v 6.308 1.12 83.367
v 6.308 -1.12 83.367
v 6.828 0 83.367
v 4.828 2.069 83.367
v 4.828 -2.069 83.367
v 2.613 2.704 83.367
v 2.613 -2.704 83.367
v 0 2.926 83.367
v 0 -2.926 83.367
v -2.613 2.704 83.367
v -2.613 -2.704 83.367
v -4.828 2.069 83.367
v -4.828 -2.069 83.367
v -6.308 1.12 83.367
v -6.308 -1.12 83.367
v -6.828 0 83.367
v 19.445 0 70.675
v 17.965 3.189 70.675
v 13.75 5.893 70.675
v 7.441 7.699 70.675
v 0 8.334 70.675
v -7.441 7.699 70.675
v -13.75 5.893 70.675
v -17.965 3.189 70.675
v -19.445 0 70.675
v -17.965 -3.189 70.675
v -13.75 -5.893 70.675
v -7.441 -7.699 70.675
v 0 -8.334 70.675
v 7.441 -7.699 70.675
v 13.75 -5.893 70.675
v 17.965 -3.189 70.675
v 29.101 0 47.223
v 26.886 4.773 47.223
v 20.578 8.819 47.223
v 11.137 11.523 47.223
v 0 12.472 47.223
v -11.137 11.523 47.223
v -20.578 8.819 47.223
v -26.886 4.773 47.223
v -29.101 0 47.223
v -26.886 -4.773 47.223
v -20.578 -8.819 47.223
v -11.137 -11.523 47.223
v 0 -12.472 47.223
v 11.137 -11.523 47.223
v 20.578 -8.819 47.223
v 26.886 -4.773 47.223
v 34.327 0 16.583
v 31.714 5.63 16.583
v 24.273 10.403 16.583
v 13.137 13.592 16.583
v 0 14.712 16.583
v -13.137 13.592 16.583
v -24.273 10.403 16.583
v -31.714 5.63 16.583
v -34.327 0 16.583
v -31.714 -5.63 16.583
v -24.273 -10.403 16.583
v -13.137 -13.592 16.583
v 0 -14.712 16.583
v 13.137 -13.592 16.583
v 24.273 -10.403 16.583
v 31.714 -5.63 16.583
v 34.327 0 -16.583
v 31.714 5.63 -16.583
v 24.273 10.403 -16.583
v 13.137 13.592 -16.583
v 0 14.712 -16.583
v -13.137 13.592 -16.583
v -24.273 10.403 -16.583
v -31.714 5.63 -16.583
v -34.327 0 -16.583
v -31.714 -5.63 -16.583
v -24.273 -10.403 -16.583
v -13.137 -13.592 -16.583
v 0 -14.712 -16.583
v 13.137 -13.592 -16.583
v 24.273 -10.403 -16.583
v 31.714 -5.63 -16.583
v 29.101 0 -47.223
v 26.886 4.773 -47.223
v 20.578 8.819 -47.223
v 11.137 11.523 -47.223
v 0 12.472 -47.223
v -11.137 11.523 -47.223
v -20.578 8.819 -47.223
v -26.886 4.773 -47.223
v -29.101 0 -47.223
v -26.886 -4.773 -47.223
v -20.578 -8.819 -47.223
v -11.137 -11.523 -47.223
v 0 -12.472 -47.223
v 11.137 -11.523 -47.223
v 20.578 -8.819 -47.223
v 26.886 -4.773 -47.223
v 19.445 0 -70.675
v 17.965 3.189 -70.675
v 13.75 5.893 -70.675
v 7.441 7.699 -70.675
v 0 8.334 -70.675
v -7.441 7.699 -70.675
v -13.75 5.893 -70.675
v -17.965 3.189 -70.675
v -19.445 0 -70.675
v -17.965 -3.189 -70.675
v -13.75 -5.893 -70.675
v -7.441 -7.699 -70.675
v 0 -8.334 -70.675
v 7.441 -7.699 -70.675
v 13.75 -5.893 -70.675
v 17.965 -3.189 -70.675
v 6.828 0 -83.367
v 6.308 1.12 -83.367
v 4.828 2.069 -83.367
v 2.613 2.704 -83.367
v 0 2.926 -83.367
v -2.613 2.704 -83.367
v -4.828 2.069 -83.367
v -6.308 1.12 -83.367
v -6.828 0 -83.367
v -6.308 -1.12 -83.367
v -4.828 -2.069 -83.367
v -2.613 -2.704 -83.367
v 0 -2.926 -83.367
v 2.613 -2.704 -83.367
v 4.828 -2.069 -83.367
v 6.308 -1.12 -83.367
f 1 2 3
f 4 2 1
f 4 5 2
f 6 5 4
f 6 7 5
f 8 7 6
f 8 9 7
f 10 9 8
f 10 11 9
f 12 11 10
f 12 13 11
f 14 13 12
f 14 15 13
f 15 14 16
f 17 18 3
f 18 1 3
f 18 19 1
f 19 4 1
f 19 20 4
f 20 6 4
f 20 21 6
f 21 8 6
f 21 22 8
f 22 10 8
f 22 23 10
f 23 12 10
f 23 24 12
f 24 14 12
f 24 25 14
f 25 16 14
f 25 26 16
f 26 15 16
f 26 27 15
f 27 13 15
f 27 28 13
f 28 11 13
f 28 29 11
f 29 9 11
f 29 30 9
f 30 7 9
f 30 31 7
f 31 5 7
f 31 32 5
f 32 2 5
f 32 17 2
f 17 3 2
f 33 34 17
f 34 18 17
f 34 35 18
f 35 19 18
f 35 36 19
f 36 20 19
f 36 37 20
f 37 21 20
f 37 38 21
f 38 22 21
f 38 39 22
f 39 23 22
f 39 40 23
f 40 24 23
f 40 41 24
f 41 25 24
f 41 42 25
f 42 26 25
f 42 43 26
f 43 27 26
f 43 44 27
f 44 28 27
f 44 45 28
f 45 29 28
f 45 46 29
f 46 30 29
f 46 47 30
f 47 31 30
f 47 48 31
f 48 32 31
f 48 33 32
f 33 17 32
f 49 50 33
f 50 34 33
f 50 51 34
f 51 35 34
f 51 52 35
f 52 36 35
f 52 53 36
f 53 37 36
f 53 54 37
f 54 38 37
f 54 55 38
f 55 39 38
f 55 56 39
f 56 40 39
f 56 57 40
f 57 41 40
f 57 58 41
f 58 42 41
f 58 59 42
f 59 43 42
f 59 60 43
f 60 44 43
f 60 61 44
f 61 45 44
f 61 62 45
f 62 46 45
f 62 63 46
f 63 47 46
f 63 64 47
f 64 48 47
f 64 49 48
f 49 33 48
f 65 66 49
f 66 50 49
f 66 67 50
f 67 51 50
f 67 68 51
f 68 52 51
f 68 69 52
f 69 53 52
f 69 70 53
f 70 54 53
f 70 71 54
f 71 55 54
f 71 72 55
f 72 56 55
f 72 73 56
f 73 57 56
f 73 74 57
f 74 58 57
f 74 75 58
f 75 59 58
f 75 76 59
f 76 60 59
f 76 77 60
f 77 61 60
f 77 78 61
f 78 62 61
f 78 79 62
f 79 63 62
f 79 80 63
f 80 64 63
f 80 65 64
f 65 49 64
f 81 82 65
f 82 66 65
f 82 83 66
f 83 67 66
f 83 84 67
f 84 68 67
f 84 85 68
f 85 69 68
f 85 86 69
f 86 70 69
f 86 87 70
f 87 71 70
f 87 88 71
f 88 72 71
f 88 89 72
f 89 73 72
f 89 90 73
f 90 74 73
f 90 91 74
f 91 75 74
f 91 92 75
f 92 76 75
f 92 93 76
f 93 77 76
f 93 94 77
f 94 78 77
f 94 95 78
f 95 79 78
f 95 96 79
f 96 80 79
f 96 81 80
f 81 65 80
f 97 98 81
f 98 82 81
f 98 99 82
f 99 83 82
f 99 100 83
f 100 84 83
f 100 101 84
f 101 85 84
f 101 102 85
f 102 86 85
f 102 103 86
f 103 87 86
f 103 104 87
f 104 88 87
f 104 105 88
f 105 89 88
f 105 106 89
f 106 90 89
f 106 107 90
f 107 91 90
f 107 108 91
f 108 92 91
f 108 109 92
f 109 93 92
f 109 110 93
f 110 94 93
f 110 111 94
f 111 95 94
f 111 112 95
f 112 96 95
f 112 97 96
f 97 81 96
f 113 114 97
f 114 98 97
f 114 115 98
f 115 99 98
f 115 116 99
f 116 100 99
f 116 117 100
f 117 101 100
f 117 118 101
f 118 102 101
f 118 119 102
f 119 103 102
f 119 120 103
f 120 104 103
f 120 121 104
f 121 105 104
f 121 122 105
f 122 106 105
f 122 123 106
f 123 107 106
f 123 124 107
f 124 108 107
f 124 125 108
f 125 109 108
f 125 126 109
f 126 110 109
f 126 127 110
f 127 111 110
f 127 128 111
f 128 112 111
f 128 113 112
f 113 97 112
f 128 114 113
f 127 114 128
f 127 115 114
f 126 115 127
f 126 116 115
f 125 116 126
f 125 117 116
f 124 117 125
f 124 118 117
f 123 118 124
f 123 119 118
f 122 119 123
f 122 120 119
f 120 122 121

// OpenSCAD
// Generated by SolidPython 1.0.1 on 2020-07-29 00:46:47


scale(v = [7, 3, 17]) {
	sphere(r = 5);
}
/***********************************************
*********      SolidPython code:      **********
************************************************
 
# import packages: SolidPython
from solid import *
from solid.utils import *
from itertools import chain, combinations, permutations


class Resize:

    def __init__(self, scad_file):
        self.scad_file = scad_file
        #self.scad_file = import_scad(scad_file)
        # cone/cylinder param:
        self.r1 = 0
        self.r2 = 0
        self.h = 0
        # rectangular prism param:
        self.w = 0
        self.l = 0
        # ellipse param:
        self.r = 0

    # import OpenScad code (file name corresponds to shape)


    # classify shape + parameters
    def assign(self, param1, param2, param3):
        if self.scad_file == 'cone.scad':
            self.r1 = param1
            self.r2 = param2
            self.h = param3
        elif self.scad_file == 'cylinder.scad':
            self.r1 = param1
            self.r2 = param2
            self.h = param3
        elif self.scad_file == 'rectangularPrism.scad':
            self.h = param1
            self.l = param2
            self.w = param3
        else:
            self.r = param1
            self.h = param2

    # resize parameters
    def iterate(self):
        x = range(3, 20, 2)
        i = 1
        if self.scad_file == 'cone.scad':
            tempList = list(permutations(x, 2))
            for temp in tempList:
                param1 = temp[0]
                param2 = temp[1]
                filepath = 'produced_scad_files/' + 'cone' + str(param1) + '_' + str(param2) + '_' + '.scad'
                scad_render_to_file(cylinder(h=param1, r1=param2, r2=0), filepath)

        elif self.scad_file == 'cylinder.scad':
            tempList = list(permutations(x, 3))
            for temp in tempList:
                param1 = temp[0]
                param2 = temp[1]
                filepath = 'produced_scad_files/' + 'cylinder' + str(param1) + '_' + str(param2) + '_' + '.scad'
                scad_render_to_file(cylinder(h=param1, r1=param2, r2=param2), filepath)

        elif self.scad_file == 'rectangularPrism.scad':
            tempList = list(permutations(x, 3))
            for temp in tempList:
                param1 = temp[0]
                param2 = temp[1]
                param3 = temp[2]
                filepath = 'produced_scad_files/' + 'rectangularPrism' + str(param1) + '_' + str(param2) + '_' + str(
                    param3) + '.scad'
                scad_render_to_file(cube(size=(param1, param2, param3)), filepath)

        elif self.scad_file == 'ellipse.scad':
            tempList = list(permutations(x, 4))
            for temp in tempList:
                param1 = temp[0]
                param2 = temp[1]
                param3 = temp[2]
                param4 = temp[3]
                filepath = 'produced_scad_files/' + 'ellipse' + str(param1) + '_' + str(param2) + '_' + str(param3) + '_' + str(param4) + '.scad'
                scad_render_to_file(scale([param1, param2, param3])(sphere(r=param4)), filepath)

    def render_to_scadfile(self):
        scad_render_to_file(scad, 'example.scad') 
 
************************************************/
